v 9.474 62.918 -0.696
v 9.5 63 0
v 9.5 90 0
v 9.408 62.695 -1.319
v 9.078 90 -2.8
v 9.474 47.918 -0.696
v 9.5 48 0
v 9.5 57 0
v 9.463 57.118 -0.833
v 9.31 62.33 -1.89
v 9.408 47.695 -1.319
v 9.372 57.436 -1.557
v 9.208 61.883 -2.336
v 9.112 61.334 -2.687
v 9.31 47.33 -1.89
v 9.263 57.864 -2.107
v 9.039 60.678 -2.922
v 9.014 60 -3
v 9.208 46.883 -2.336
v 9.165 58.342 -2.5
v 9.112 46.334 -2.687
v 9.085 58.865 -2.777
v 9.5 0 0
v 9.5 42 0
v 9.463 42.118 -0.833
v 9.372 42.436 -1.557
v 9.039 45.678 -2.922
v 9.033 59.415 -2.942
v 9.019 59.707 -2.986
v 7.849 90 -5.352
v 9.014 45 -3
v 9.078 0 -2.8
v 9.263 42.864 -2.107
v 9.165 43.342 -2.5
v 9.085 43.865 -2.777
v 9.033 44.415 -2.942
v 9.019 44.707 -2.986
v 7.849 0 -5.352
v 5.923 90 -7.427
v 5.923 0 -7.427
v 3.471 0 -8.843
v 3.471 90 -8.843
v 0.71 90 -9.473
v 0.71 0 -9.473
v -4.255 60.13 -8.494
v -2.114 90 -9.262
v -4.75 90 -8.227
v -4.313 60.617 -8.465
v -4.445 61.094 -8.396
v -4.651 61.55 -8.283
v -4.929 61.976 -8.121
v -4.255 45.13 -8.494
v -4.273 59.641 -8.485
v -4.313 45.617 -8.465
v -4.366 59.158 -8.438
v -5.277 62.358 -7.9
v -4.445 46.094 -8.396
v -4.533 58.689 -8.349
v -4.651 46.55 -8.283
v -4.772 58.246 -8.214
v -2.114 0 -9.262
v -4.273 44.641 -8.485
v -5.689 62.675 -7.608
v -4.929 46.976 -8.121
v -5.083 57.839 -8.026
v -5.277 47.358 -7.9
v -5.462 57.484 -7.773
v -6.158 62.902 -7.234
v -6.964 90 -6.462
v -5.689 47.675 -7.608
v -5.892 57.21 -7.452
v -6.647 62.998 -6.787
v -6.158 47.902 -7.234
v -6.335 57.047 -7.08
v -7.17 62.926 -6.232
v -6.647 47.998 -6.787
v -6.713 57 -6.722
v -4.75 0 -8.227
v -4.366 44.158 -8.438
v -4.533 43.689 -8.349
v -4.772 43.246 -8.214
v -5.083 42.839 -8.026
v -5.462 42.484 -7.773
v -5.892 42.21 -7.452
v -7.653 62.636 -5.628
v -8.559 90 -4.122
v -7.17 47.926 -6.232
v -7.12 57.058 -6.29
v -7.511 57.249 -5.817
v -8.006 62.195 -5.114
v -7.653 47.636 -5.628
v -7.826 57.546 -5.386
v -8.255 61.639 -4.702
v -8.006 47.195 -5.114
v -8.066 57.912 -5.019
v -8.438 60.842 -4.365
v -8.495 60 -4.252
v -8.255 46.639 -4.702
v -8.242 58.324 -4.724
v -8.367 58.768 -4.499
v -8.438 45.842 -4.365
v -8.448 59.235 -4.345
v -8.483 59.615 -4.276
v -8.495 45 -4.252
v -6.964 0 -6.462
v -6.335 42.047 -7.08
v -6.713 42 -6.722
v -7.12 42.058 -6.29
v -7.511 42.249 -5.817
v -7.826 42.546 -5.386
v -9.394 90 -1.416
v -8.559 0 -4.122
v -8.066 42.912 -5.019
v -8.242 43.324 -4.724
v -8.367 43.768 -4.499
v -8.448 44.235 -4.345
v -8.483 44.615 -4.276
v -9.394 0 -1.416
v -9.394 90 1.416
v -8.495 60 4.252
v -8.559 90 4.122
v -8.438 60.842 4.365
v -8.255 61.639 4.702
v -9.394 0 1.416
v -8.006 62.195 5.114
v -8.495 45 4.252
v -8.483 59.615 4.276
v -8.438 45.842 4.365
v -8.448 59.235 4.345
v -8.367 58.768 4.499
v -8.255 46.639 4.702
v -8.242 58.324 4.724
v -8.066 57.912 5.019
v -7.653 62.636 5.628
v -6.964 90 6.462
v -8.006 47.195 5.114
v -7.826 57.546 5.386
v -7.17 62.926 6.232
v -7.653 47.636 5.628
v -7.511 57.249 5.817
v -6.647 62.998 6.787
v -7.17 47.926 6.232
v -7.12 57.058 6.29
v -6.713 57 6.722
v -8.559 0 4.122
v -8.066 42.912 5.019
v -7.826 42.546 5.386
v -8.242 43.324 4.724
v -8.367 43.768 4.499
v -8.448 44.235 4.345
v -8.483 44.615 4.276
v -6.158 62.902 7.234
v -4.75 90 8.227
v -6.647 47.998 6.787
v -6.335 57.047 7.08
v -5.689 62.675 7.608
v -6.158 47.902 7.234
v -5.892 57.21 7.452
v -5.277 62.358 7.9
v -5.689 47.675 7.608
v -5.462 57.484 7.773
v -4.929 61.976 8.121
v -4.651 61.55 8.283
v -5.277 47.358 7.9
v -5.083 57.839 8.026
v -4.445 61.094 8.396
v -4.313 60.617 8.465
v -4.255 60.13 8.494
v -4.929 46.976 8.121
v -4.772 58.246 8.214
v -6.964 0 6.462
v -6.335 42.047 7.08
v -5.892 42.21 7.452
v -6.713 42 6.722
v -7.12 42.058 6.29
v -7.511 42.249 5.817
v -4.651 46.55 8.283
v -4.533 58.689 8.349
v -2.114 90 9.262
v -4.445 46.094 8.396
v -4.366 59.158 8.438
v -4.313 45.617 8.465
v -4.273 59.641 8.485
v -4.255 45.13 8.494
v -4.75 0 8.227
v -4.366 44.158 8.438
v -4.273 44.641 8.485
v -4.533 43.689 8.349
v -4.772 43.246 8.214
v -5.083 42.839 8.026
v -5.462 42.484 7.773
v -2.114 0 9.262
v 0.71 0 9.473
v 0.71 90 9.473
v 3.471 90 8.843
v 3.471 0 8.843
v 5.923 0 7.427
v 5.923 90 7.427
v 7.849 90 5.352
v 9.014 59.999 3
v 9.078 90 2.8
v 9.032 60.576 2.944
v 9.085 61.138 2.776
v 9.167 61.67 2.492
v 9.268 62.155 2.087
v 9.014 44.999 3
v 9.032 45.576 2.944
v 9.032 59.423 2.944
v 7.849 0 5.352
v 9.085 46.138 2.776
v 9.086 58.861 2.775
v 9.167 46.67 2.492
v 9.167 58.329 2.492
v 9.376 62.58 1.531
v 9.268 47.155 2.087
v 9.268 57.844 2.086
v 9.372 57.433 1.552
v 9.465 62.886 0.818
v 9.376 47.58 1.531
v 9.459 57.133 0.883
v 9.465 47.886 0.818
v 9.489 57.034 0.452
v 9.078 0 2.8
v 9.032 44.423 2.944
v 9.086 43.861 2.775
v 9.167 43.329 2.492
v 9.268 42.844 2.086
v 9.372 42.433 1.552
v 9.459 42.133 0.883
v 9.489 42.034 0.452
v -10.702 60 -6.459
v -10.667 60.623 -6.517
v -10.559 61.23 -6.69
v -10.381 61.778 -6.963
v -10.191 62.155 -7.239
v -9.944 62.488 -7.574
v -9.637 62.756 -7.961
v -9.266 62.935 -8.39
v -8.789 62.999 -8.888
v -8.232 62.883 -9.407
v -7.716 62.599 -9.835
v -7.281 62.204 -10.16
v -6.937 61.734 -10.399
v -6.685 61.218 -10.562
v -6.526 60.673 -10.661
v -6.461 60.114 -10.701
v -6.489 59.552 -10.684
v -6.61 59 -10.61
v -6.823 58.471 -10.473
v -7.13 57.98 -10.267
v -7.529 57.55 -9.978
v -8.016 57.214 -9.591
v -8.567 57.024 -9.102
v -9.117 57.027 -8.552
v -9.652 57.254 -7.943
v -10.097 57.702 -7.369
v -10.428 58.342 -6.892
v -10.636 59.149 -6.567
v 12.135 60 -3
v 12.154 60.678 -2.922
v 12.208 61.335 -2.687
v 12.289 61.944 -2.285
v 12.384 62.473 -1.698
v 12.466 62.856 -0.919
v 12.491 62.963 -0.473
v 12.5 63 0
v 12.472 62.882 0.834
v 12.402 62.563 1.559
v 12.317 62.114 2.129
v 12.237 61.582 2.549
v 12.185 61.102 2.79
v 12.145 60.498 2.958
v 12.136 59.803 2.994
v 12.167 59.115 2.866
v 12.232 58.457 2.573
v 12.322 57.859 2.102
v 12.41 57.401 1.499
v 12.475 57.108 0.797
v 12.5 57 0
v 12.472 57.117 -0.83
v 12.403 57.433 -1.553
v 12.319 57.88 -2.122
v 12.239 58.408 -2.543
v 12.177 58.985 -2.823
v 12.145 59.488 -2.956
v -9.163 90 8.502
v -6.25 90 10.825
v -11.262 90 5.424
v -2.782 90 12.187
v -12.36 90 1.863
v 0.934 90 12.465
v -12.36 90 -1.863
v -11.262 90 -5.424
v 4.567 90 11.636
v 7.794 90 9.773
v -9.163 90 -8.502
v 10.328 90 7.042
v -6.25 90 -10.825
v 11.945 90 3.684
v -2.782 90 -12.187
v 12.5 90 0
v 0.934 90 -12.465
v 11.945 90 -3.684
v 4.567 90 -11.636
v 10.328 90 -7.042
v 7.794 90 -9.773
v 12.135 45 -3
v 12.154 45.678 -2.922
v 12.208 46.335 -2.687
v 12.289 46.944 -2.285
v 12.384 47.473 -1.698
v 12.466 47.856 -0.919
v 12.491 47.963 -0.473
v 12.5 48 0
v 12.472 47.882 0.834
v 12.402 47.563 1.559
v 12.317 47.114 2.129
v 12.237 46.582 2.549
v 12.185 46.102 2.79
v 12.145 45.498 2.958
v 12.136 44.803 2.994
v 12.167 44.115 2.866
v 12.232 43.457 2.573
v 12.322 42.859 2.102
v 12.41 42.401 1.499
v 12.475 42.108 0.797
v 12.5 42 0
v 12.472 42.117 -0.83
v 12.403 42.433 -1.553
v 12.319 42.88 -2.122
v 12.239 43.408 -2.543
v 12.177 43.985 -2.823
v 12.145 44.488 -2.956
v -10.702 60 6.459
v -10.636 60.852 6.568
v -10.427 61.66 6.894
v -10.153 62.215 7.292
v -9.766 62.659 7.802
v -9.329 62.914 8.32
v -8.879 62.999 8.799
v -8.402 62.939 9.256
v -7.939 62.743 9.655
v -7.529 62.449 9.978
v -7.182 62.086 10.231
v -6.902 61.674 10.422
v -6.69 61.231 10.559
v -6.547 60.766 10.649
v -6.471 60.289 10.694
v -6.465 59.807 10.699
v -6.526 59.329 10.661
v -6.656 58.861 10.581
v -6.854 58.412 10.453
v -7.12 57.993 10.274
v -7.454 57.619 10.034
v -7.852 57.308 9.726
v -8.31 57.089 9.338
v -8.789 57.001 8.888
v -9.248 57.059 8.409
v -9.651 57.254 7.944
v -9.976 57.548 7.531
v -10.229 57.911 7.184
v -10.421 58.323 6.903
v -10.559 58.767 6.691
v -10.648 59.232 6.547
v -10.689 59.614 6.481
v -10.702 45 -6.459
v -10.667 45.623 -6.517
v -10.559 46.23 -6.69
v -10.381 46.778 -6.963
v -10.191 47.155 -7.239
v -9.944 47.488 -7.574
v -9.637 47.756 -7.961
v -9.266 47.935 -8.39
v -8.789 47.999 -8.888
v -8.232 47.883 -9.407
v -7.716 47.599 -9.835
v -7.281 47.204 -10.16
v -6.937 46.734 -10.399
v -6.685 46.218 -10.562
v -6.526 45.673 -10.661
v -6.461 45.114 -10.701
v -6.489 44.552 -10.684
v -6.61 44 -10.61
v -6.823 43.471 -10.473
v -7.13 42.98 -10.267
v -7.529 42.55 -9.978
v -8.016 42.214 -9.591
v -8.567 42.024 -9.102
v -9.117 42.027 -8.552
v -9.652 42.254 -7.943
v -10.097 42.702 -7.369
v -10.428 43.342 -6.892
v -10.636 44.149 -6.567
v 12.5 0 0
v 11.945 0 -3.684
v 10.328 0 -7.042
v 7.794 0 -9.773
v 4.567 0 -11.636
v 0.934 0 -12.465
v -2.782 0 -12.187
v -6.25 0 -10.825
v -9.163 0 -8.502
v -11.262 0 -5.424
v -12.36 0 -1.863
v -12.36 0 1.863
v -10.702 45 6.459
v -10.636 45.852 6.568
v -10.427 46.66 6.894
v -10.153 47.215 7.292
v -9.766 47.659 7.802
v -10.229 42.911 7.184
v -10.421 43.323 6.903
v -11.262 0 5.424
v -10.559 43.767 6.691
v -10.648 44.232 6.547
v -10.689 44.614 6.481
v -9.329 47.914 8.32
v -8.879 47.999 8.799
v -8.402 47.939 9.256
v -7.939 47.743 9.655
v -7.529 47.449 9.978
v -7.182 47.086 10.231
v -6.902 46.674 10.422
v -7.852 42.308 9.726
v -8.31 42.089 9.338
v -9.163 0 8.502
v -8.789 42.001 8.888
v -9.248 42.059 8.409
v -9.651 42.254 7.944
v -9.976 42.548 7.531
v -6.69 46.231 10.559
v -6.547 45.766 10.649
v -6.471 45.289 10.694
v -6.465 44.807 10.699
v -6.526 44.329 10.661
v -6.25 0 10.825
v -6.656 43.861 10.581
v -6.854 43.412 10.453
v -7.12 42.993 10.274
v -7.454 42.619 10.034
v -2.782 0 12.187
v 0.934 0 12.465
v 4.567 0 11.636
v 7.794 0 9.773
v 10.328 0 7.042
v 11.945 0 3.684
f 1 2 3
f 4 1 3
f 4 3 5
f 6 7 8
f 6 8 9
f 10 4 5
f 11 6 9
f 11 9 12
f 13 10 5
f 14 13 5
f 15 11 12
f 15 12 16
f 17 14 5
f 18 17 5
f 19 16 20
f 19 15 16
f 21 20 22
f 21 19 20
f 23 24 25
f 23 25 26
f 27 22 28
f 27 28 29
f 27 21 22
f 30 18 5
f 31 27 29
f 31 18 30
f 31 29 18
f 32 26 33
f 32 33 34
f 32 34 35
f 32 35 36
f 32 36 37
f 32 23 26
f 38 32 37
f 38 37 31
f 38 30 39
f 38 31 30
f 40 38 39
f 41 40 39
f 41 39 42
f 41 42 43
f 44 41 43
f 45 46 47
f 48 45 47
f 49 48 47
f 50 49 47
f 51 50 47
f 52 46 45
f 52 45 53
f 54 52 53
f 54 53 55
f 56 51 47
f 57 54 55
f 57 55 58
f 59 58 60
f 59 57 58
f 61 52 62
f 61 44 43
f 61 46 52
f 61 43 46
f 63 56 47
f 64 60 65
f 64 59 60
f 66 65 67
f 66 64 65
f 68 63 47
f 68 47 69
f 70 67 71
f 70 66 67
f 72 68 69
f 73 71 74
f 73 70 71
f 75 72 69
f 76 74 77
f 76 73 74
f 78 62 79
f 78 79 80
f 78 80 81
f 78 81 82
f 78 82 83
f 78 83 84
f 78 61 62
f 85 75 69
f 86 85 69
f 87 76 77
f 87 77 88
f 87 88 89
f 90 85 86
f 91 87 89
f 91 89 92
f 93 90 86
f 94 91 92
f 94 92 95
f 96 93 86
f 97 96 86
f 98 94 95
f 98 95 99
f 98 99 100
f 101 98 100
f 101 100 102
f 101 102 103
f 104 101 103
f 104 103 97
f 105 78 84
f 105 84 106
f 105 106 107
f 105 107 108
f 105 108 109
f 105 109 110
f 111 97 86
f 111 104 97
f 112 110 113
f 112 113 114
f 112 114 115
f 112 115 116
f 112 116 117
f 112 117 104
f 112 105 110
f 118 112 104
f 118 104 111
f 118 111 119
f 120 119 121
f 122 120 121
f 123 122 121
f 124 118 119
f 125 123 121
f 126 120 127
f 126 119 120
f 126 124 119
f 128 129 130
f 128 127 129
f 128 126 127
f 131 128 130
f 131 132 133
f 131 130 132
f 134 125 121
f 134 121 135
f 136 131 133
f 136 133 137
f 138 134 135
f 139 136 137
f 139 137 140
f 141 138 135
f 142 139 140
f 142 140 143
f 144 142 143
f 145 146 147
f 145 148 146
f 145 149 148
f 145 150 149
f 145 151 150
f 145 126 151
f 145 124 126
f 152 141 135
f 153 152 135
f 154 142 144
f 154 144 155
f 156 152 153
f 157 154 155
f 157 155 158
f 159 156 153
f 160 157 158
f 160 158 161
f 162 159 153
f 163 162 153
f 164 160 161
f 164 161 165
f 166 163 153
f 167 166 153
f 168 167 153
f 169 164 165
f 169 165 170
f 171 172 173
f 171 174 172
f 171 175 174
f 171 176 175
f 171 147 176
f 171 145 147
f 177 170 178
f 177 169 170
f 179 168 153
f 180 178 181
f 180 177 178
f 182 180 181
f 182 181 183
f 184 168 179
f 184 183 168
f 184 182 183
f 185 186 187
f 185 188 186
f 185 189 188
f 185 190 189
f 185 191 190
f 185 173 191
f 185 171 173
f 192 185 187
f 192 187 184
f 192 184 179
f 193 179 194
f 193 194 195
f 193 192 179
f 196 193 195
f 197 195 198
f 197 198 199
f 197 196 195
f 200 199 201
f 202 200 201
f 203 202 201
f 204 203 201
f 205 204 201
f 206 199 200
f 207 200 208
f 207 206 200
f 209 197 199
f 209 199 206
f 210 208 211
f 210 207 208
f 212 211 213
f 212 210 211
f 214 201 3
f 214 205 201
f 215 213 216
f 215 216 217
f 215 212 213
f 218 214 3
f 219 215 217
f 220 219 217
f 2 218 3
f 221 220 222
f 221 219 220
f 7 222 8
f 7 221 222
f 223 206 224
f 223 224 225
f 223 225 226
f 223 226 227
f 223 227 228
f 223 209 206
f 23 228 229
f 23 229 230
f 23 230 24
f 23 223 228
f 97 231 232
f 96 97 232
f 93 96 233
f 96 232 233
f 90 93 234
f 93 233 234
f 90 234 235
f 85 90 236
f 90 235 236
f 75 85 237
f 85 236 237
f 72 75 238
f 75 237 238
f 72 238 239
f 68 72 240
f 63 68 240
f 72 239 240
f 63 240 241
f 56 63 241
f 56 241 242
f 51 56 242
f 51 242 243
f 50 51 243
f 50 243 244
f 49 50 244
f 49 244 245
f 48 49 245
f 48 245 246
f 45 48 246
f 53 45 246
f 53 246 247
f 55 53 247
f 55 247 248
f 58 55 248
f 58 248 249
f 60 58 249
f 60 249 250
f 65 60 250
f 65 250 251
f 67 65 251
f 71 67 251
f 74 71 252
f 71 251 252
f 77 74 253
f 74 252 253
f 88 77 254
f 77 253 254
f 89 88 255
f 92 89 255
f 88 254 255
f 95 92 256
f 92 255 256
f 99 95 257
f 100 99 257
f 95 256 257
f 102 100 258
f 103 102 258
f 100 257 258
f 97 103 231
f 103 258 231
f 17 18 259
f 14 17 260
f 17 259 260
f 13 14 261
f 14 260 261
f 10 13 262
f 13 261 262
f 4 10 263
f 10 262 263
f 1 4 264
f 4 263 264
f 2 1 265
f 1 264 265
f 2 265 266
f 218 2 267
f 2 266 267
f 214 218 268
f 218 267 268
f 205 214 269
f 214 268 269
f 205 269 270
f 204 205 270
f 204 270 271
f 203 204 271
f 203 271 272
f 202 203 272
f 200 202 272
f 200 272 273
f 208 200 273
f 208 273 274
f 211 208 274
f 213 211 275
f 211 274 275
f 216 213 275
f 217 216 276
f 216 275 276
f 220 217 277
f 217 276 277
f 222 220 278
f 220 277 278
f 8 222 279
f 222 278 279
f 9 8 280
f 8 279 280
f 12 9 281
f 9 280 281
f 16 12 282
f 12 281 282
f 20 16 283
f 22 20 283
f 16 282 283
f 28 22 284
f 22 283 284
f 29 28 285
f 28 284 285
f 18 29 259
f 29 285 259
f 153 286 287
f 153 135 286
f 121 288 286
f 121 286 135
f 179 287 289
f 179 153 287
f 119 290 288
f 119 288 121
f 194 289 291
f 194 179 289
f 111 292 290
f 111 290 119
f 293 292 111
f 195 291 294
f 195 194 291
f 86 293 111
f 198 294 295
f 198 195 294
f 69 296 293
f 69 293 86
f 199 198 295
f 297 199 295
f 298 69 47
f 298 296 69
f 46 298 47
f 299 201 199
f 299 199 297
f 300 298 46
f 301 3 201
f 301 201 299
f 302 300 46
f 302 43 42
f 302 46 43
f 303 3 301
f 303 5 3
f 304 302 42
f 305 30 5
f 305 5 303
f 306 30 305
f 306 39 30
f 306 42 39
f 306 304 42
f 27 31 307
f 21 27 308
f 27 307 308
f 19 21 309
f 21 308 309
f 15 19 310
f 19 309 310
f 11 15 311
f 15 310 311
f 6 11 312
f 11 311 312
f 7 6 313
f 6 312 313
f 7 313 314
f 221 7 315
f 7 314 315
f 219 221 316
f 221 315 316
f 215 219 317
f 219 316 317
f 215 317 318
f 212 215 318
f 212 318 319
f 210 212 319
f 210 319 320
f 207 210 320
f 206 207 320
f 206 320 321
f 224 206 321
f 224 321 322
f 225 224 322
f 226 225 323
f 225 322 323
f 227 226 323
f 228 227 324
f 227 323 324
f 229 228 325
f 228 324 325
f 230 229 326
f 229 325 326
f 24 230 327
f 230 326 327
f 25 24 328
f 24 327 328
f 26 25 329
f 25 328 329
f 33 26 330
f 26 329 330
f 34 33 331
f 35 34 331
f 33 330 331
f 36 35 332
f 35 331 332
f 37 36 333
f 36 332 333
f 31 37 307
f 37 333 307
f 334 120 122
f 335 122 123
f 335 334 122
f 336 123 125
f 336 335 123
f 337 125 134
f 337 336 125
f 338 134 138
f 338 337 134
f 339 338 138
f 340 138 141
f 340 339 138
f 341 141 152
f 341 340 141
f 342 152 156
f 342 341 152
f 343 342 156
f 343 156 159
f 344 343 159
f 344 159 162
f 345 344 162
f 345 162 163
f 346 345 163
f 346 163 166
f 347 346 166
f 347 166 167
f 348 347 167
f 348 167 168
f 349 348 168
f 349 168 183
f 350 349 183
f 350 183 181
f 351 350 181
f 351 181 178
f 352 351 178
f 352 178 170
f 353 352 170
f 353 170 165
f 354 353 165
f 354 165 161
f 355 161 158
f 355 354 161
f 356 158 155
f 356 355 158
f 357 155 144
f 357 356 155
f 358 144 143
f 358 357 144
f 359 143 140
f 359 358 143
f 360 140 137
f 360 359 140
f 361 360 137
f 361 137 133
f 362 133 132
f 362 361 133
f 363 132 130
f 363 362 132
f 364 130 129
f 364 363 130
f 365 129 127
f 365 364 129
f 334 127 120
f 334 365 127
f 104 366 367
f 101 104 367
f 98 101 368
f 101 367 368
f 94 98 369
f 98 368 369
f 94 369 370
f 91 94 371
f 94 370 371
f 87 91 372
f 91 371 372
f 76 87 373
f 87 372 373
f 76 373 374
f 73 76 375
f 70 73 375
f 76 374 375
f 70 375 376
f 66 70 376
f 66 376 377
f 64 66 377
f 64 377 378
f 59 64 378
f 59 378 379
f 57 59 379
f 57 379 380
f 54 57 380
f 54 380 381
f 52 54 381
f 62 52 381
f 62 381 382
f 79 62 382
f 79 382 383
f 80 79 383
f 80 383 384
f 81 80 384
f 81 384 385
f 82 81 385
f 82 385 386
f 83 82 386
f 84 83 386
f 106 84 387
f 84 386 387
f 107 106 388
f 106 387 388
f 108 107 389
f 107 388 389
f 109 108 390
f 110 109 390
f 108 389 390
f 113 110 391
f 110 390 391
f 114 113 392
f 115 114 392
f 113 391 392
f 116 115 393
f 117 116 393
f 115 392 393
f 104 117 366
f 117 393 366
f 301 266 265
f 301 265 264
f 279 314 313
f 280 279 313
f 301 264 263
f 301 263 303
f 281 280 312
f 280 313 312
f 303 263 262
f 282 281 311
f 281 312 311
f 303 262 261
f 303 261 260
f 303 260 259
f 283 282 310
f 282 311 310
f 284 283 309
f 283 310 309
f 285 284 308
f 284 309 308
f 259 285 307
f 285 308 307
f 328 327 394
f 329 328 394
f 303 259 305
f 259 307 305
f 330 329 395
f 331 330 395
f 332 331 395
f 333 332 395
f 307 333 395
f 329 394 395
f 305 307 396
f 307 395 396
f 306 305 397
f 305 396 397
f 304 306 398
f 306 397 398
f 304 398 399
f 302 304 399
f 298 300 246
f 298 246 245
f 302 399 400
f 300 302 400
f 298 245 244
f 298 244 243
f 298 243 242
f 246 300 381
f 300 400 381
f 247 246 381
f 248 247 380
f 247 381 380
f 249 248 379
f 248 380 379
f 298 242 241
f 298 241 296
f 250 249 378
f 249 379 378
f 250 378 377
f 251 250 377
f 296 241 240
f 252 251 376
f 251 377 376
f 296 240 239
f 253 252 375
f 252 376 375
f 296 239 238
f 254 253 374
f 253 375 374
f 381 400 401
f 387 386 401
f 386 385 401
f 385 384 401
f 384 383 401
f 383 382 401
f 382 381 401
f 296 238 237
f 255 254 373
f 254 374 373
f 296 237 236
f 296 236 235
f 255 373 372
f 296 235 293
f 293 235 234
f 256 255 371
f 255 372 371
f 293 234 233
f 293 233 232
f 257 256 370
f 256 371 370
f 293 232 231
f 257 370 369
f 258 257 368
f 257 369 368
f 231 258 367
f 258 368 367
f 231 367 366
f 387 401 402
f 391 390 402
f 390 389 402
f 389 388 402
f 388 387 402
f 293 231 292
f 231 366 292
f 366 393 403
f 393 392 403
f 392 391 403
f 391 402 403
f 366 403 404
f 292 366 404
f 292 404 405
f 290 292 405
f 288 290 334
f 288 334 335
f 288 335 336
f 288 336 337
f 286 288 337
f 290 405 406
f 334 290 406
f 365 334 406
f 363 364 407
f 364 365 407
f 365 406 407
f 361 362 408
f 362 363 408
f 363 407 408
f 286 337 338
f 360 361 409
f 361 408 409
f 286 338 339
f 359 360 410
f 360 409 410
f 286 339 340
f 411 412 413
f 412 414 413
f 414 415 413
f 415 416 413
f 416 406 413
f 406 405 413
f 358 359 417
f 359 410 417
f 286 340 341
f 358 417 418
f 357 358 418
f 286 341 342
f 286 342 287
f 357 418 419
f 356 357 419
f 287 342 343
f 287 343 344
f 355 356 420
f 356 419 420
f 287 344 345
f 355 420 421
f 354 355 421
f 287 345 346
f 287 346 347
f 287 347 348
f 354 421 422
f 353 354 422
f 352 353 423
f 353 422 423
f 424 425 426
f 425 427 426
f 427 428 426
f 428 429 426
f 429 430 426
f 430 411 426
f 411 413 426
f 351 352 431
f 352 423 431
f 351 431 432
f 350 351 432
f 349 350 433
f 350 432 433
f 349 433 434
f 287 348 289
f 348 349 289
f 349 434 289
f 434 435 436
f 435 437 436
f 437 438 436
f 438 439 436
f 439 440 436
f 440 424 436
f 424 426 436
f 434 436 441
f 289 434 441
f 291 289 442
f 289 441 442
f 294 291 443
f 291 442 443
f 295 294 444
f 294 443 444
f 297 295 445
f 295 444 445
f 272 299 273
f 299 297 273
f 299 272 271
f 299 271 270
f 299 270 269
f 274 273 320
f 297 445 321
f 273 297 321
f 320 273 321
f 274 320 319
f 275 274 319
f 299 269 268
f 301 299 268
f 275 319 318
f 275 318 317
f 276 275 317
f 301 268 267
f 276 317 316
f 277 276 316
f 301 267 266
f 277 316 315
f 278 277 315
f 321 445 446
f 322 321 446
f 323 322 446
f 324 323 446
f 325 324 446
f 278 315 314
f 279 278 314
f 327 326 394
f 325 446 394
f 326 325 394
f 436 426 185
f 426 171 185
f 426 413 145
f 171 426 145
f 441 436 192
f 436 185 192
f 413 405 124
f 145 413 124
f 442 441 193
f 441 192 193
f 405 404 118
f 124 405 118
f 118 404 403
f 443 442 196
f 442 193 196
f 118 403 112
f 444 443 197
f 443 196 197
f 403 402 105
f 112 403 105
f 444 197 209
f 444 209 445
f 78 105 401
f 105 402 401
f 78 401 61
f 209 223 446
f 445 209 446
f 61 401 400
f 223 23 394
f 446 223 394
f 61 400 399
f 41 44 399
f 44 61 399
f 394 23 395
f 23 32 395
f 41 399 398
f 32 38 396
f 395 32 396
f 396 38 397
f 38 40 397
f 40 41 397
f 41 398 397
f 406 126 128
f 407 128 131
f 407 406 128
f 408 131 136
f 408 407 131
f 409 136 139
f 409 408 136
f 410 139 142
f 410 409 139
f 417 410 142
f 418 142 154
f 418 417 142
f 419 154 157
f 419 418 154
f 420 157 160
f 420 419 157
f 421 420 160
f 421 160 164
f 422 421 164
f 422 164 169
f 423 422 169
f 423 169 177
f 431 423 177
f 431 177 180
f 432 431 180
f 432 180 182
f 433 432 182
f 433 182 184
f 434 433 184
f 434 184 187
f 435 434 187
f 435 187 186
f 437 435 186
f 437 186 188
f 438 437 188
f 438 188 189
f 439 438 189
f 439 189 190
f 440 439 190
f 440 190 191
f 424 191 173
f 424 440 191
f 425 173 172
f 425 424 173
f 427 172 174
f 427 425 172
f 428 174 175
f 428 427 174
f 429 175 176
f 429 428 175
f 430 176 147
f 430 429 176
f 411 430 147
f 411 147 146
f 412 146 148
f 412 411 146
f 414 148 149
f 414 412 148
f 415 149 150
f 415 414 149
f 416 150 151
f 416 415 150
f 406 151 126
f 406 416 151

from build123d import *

# Parameters (mm, degrees)
SKETCH2_R           = 12.5
SKETCH2_R_2         = 9.5
BOSS_EXTRUDE1_DEPTH = 90
SKETCH4_R           = 3
CUT_EXTRUDE1_DEPTH  = 10
SKETCH5_R           = 3
CUT_EXTRUDE2_DEPTH  = 10


with BuildPart() as part:
    # Sketch2 → Boss-Extrude1 (new body)
    with BuildSketch(Plane(origin=(0, 0, 0), x_dir=(1, 0, 0), z_dir=(0, 1, 0))):
        Circle(SKETCH2_R)
        Circle(SKETCH2_R_2, mode=Mode.SUBTRACT)
    extrude(amount=BOSS_EXTRUDE1_DEPTH)

    # Sketch4 → Cut-Extrude1 (cut)
    with BuildSketch(Plane(origin=(12.5, 0, 0), x_dir=(0, 0, -1), z_dir=(1, 0, 0))):
        with Locations((0, 60)):
            Circle(SKETCH4_R)
        with Locations((0, 45)):
            Circle(SKETCH4_R)
    extrude(amount=-CUT_EXTRUDE1_DEPTH, mode=Mode.SUBTRACT)

    # Sketch5 → Cut-Extrude2 (cut)
    with BuildSketch(Plane(origin=(-8.838834765, 0, -8.838834765), x_dir=(-0.707106781, 0, 0.707106781), z_dir=(-0.707106781, 0, -0.707106781))):
        with Locations((0, 60)):
            Circle(SKETCH5_R)
        with Locations((0, 45)):
            Circle(SKETCH5_R)
    cut_extrude2 = extrude(amount=-CUT_EXTRUDE2_DEPTH, mode=Mode.SUBTRACT)

    # Mirror1: Cut-Extrude2 across plane
    add(cut_extrude2.mirror(Plane.XY), mode=Mode.SUBTRACT)


solid = part.part
